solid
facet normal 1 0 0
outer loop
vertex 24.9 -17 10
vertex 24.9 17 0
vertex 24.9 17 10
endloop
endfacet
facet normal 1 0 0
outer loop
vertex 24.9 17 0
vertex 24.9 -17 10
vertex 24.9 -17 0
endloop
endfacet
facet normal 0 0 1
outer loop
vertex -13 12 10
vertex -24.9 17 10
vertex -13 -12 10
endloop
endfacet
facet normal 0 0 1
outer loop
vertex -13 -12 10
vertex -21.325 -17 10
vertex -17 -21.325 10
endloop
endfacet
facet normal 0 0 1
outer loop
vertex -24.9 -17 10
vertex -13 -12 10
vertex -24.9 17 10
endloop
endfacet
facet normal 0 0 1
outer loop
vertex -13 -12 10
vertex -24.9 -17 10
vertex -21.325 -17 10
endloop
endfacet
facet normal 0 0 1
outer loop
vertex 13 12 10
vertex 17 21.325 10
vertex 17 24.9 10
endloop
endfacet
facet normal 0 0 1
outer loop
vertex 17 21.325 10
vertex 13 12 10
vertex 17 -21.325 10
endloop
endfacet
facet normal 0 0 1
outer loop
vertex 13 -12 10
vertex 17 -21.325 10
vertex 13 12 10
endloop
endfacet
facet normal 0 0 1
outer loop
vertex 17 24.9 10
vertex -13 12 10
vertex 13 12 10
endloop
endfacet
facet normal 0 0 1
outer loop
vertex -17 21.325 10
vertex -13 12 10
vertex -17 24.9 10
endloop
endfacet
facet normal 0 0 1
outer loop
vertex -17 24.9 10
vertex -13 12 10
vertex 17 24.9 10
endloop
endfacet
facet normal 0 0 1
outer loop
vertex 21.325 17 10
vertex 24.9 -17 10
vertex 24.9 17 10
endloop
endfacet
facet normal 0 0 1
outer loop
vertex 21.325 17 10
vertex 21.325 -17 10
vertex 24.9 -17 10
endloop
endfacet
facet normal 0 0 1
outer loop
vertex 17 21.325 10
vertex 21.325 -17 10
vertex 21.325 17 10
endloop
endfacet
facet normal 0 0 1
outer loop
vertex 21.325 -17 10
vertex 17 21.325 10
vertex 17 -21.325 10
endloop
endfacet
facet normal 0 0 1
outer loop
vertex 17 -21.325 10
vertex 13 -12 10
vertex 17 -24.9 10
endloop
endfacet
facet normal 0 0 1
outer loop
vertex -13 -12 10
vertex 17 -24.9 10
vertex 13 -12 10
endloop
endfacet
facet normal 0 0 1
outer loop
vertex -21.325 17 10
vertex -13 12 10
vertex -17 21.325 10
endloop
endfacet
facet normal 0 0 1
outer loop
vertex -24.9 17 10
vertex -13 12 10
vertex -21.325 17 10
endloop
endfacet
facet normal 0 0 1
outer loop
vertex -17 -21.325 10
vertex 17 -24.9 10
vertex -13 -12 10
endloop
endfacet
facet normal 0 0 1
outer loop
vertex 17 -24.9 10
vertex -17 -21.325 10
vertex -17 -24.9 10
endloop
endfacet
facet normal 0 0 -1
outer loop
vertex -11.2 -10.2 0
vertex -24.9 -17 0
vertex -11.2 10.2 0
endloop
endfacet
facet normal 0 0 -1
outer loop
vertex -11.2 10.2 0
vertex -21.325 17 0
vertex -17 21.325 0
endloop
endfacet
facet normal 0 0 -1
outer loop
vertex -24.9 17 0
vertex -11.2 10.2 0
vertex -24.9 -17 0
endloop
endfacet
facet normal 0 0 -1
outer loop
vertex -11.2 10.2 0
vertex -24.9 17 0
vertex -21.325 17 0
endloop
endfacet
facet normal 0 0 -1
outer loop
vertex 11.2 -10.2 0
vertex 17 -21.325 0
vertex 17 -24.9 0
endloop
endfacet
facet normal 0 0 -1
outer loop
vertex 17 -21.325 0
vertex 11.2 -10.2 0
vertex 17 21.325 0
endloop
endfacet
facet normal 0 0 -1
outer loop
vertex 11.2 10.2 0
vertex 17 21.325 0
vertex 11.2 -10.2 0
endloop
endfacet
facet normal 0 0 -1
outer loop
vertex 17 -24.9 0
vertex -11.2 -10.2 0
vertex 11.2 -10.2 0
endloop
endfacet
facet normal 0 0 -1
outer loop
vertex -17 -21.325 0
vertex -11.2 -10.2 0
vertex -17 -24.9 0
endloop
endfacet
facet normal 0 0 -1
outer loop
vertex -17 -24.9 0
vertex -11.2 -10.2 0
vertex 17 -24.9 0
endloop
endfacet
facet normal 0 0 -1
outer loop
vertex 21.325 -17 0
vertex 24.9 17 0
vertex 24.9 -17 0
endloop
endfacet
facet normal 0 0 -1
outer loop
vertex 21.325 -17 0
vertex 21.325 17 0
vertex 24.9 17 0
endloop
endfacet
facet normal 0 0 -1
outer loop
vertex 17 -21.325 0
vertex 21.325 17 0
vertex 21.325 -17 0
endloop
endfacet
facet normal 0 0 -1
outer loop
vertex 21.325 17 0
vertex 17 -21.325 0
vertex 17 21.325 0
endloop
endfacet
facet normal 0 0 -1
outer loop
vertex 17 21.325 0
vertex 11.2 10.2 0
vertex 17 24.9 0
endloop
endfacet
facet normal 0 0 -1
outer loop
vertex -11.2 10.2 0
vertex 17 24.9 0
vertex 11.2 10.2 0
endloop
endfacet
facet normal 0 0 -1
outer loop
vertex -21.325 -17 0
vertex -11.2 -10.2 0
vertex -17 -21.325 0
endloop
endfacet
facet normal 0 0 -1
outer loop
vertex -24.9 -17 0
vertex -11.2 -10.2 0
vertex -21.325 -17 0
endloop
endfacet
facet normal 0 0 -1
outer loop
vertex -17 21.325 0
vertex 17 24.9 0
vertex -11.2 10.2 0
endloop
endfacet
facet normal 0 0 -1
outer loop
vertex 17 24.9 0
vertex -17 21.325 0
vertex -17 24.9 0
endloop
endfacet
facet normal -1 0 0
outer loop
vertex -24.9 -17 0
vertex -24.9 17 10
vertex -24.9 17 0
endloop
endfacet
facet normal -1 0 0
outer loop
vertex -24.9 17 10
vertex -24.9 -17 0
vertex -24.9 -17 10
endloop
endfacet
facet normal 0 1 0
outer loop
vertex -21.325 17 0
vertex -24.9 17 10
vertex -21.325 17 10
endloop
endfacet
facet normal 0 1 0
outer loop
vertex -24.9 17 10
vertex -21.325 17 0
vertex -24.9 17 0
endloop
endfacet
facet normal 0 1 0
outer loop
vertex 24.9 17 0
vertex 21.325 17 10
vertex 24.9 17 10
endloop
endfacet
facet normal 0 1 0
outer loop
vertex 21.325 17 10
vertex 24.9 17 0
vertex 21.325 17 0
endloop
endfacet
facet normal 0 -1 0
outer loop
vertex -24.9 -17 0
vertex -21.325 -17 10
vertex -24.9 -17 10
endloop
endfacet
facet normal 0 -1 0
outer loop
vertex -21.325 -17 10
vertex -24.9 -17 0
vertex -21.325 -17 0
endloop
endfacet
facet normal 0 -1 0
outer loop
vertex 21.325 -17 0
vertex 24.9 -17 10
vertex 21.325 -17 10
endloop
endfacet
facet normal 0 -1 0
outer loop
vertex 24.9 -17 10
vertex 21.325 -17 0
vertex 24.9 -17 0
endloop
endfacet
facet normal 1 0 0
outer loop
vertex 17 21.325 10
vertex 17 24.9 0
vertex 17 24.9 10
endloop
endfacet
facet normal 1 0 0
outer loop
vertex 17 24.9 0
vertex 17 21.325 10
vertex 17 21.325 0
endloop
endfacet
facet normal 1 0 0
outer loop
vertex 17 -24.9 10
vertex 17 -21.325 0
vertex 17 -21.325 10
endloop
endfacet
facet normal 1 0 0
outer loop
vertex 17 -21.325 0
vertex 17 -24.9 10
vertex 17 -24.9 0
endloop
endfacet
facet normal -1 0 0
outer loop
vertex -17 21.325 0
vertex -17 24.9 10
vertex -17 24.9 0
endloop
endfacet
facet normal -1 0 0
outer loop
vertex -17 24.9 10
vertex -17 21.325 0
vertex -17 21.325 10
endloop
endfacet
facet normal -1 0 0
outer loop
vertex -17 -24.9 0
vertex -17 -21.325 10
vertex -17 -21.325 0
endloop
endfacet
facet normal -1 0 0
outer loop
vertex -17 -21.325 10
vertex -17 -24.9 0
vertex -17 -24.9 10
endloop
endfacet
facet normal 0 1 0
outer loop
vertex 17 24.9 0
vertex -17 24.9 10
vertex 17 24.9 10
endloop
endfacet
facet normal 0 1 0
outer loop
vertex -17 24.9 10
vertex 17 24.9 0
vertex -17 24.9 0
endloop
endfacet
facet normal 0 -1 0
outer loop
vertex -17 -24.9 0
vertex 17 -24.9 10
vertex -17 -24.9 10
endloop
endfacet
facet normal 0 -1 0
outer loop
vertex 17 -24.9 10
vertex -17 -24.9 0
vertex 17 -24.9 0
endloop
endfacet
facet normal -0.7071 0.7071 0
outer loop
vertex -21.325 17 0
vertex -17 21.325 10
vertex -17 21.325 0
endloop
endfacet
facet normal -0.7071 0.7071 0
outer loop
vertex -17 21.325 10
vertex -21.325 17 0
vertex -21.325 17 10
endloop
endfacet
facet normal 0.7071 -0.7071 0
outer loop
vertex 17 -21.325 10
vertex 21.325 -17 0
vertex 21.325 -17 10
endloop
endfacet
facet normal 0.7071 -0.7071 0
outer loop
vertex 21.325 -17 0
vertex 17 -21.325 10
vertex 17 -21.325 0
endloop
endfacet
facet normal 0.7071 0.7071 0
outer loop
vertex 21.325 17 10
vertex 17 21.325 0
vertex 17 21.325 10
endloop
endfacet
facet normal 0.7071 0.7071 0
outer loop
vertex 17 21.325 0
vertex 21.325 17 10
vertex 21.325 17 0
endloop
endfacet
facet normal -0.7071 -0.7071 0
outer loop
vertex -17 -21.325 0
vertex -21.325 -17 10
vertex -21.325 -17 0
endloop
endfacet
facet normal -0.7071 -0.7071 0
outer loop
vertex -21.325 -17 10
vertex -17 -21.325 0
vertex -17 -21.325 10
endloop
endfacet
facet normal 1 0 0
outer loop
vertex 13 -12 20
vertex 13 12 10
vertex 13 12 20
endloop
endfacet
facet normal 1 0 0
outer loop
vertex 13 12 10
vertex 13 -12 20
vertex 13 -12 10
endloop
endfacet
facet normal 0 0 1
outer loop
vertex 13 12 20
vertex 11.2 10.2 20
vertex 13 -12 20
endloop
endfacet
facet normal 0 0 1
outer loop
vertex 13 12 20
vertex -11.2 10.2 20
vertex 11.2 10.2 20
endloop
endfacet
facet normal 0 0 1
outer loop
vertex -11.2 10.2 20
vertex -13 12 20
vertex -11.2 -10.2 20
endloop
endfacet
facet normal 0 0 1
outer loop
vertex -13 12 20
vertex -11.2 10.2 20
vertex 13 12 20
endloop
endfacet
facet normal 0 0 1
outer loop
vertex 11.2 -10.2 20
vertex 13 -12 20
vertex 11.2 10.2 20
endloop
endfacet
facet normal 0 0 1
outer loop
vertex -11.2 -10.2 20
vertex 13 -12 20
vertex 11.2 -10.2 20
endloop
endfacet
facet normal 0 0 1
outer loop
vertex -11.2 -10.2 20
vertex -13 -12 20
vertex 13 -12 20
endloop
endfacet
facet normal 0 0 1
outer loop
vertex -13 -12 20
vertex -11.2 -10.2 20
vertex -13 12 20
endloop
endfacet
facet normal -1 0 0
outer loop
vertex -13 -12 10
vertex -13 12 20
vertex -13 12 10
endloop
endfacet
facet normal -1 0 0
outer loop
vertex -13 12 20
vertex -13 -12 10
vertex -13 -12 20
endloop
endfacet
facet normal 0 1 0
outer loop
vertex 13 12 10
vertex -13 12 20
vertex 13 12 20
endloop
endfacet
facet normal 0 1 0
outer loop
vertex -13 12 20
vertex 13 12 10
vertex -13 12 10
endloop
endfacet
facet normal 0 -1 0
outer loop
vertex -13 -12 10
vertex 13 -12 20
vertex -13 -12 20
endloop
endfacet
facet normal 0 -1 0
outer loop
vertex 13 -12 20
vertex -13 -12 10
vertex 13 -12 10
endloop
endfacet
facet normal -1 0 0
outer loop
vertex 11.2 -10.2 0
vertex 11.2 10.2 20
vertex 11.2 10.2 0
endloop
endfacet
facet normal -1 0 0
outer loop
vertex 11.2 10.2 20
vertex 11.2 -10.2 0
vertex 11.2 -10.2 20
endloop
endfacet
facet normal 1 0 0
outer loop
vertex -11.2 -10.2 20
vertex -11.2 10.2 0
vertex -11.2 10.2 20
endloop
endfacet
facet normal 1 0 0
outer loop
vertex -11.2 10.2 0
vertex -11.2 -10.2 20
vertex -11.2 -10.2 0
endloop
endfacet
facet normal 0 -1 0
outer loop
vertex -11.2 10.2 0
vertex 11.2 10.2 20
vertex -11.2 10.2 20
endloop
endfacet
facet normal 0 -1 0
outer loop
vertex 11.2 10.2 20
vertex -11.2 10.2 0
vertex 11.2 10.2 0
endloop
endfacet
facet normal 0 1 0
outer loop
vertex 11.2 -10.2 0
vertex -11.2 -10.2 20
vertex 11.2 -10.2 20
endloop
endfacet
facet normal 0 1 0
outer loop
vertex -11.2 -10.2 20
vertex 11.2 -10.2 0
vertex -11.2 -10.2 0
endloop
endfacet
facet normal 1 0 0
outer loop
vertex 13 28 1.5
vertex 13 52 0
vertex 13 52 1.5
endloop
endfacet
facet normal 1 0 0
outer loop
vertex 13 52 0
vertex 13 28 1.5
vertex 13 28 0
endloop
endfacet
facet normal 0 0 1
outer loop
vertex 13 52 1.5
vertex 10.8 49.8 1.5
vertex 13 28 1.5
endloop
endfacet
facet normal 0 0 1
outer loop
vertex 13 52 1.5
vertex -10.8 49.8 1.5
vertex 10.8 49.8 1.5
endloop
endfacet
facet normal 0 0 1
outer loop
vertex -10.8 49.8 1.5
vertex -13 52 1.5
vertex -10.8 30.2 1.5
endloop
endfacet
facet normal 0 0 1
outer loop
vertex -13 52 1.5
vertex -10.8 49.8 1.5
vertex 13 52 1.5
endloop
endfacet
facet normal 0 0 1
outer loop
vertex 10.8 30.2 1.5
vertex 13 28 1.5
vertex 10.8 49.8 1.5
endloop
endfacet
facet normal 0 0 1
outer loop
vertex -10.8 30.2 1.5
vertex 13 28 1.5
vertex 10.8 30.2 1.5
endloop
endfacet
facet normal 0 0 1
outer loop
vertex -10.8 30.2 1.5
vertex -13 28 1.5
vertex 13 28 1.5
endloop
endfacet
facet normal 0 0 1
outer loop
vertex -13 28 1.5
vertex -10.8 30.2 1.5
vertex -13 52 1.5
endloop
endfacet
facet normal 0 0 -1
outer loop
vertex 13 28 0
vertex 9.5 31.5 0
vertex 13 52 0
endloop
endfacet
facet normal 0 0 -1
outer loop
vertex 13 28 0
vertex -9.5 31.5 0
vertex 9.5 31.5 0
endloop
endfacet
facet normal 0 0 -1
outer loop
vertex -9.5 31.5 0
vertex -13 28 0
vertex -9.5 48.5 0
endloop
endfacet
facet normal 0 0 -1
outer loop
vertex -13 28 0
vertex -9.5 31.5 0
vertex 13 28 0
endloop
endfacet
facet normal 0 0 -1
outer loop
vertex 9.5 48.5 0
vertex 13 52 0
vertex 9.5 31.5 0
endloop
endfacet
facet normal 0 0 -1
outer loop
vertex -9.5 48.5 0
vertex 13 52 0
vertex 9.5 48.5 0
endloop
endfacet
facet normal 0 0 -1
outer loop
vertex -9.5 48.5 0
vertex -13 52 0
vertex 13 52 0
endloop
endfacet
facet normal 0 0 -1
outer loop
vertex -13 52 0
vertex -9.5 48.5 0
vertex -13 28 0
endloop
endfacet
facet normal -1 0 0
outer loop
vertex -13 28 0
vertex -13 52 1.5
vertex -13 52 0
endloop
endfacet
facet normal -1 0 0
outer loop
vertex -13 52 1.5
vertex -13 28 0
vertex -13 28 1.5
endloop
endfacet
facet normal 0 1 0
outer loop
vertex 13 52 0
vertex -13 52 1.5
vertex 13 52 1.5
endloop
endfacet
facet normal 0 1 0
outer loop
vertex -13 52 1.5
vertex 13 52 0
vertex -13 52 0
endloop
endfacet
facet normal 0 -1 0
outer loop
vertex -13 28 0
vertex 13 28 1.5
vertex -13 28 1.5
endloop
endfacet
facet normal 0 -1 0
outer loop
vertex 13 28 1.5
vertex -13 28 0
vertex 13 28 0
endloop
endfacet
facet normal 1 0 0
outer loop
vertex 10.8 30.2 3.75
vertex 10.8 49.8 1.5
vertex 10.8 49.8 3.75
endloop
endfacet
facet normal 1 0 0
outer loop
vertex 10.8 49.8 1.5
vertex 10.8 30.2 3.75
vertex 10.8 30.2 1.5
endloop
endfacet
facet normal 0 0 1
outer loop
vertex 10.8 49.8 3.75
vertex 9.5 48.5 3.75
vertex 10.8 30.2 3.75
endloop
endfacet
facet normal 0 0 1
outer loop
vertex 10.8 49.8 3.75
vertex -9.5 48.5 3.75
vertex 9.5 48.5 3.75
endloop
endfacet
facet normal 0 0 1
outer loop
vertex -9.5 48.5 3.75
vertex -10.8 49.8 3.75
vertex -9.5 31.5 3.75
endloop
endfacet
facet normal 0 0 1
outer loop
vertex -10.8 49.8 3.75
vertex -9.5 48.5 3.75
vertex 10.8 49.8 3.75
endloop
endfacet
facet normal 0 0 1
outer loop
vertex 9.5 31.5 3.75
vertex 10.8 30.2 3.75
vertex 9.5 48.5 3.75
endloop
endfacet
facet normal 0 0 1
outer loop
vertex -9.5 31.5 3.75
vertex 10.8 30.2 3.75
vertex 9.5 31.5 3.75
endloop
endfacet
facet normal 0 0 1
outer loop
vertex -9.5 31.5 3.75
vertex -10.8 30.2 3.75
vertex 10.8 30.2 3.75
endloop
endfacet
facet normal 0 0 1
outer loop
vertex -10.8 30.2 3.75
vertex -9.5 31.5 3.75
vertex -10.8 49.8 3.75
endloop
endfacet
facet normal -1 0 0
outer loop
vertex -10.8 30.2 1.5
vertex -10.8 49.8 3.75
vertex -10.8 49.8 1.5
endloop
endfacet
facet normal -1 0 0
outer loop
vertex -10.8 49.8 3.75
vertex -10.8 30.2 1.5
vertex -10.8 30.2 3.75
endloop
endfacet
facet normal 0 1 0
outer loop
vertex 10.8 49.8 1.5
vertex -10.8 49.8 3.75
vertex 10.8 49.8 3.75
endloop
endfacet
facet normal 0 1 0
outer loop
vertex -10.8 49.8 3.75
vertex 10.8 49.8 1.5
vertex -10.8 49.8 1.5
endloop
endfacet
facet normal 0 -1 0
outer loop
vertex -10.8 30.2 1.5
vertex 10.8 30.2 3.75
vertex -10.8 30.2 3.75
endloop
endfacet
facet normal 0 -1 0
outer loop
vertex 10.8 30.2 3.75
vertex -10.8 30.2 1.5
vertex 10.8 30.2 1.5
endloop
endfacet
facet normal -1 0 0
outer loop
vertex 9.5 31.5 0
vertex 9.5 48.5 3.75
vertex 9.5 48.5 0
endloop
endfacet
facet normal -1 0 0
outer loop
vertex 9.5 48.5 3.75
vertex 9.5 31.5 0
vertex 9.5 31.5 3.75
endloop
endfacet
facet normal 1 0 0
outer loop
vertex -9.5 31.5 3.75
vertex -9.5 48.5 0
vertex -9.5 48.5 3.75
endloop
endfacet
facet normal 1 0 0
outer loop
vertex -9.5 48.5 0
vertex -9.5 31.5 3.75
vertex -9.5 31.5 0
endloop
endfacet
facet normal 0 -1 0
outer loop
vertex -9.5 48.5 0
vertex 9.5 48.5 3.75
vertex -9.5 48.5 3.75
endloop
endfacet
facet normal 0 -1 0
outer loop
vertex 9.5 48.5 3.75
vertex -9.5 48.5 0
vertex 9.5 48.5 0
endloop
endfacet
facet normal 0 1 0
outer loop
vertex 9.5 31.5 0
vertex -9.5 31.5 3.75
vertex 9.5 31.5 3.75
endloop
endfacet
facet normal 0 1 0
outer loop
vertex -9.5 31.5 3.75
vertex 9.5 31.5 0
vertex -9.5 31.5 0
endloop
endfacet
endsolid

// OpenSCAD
//Cylindrical lens holder, ext

/* [Hiden] */
a = 49.8;
b = 33.6;
c = 6.28;
d = 53.8;
h = 10; //holder height
IM_offset = 0.2;

lens_h = 22;
lens_w = 20;

space_l = 10;
wall_th = 2;

module CubeInsert () {
    translate([0, 0, h/2])
    difference(){
        union() {   //basic insert design
            cube([a,b+2*IM_offset,h], center=true);
            cube([b+2*IM_offset,a,h], center=true);
            rotate(a=[0,0,45]){
                cube([c,d+2*IM_offset,h], center=true);
            }
            rotate(a=[0,0,-45]){
                cube([c,d+2*IM_offset,h], center=true);
            }
        }
    }
}


module CLensHolder() {
    difference() {
        union() {
            CubeInsert();
            translate([0,0,(h+space_l)/2])
                cube([lens_h+2*wall_th, lens_w+2*wall_th, h+space_l], center = true);
        }
        translate([0,0,h/2])
            cube([lens_h+2*IM_offset, lens_w+2*IM_offset, 50], center = true);
    }
}

module CLensCap() {
    difference() {
        union() {
            translate([0,0,0.75])
                cube([lens_h+2*wall_th, lens_w+2*wall_th, 1.5], center = true);
            translate([0,0,1.5+0.75])
                cube([lens_h-2*IM_offset, lens_w-2*IM_offset, 3], center = true);
            }
        
        translate([0,0,0.75])
            cube([lens_h-3, lens_w-3, 50], center = true);
    }
}


CLensHolder();

translate([0, 40, 0])
CLensCap();
